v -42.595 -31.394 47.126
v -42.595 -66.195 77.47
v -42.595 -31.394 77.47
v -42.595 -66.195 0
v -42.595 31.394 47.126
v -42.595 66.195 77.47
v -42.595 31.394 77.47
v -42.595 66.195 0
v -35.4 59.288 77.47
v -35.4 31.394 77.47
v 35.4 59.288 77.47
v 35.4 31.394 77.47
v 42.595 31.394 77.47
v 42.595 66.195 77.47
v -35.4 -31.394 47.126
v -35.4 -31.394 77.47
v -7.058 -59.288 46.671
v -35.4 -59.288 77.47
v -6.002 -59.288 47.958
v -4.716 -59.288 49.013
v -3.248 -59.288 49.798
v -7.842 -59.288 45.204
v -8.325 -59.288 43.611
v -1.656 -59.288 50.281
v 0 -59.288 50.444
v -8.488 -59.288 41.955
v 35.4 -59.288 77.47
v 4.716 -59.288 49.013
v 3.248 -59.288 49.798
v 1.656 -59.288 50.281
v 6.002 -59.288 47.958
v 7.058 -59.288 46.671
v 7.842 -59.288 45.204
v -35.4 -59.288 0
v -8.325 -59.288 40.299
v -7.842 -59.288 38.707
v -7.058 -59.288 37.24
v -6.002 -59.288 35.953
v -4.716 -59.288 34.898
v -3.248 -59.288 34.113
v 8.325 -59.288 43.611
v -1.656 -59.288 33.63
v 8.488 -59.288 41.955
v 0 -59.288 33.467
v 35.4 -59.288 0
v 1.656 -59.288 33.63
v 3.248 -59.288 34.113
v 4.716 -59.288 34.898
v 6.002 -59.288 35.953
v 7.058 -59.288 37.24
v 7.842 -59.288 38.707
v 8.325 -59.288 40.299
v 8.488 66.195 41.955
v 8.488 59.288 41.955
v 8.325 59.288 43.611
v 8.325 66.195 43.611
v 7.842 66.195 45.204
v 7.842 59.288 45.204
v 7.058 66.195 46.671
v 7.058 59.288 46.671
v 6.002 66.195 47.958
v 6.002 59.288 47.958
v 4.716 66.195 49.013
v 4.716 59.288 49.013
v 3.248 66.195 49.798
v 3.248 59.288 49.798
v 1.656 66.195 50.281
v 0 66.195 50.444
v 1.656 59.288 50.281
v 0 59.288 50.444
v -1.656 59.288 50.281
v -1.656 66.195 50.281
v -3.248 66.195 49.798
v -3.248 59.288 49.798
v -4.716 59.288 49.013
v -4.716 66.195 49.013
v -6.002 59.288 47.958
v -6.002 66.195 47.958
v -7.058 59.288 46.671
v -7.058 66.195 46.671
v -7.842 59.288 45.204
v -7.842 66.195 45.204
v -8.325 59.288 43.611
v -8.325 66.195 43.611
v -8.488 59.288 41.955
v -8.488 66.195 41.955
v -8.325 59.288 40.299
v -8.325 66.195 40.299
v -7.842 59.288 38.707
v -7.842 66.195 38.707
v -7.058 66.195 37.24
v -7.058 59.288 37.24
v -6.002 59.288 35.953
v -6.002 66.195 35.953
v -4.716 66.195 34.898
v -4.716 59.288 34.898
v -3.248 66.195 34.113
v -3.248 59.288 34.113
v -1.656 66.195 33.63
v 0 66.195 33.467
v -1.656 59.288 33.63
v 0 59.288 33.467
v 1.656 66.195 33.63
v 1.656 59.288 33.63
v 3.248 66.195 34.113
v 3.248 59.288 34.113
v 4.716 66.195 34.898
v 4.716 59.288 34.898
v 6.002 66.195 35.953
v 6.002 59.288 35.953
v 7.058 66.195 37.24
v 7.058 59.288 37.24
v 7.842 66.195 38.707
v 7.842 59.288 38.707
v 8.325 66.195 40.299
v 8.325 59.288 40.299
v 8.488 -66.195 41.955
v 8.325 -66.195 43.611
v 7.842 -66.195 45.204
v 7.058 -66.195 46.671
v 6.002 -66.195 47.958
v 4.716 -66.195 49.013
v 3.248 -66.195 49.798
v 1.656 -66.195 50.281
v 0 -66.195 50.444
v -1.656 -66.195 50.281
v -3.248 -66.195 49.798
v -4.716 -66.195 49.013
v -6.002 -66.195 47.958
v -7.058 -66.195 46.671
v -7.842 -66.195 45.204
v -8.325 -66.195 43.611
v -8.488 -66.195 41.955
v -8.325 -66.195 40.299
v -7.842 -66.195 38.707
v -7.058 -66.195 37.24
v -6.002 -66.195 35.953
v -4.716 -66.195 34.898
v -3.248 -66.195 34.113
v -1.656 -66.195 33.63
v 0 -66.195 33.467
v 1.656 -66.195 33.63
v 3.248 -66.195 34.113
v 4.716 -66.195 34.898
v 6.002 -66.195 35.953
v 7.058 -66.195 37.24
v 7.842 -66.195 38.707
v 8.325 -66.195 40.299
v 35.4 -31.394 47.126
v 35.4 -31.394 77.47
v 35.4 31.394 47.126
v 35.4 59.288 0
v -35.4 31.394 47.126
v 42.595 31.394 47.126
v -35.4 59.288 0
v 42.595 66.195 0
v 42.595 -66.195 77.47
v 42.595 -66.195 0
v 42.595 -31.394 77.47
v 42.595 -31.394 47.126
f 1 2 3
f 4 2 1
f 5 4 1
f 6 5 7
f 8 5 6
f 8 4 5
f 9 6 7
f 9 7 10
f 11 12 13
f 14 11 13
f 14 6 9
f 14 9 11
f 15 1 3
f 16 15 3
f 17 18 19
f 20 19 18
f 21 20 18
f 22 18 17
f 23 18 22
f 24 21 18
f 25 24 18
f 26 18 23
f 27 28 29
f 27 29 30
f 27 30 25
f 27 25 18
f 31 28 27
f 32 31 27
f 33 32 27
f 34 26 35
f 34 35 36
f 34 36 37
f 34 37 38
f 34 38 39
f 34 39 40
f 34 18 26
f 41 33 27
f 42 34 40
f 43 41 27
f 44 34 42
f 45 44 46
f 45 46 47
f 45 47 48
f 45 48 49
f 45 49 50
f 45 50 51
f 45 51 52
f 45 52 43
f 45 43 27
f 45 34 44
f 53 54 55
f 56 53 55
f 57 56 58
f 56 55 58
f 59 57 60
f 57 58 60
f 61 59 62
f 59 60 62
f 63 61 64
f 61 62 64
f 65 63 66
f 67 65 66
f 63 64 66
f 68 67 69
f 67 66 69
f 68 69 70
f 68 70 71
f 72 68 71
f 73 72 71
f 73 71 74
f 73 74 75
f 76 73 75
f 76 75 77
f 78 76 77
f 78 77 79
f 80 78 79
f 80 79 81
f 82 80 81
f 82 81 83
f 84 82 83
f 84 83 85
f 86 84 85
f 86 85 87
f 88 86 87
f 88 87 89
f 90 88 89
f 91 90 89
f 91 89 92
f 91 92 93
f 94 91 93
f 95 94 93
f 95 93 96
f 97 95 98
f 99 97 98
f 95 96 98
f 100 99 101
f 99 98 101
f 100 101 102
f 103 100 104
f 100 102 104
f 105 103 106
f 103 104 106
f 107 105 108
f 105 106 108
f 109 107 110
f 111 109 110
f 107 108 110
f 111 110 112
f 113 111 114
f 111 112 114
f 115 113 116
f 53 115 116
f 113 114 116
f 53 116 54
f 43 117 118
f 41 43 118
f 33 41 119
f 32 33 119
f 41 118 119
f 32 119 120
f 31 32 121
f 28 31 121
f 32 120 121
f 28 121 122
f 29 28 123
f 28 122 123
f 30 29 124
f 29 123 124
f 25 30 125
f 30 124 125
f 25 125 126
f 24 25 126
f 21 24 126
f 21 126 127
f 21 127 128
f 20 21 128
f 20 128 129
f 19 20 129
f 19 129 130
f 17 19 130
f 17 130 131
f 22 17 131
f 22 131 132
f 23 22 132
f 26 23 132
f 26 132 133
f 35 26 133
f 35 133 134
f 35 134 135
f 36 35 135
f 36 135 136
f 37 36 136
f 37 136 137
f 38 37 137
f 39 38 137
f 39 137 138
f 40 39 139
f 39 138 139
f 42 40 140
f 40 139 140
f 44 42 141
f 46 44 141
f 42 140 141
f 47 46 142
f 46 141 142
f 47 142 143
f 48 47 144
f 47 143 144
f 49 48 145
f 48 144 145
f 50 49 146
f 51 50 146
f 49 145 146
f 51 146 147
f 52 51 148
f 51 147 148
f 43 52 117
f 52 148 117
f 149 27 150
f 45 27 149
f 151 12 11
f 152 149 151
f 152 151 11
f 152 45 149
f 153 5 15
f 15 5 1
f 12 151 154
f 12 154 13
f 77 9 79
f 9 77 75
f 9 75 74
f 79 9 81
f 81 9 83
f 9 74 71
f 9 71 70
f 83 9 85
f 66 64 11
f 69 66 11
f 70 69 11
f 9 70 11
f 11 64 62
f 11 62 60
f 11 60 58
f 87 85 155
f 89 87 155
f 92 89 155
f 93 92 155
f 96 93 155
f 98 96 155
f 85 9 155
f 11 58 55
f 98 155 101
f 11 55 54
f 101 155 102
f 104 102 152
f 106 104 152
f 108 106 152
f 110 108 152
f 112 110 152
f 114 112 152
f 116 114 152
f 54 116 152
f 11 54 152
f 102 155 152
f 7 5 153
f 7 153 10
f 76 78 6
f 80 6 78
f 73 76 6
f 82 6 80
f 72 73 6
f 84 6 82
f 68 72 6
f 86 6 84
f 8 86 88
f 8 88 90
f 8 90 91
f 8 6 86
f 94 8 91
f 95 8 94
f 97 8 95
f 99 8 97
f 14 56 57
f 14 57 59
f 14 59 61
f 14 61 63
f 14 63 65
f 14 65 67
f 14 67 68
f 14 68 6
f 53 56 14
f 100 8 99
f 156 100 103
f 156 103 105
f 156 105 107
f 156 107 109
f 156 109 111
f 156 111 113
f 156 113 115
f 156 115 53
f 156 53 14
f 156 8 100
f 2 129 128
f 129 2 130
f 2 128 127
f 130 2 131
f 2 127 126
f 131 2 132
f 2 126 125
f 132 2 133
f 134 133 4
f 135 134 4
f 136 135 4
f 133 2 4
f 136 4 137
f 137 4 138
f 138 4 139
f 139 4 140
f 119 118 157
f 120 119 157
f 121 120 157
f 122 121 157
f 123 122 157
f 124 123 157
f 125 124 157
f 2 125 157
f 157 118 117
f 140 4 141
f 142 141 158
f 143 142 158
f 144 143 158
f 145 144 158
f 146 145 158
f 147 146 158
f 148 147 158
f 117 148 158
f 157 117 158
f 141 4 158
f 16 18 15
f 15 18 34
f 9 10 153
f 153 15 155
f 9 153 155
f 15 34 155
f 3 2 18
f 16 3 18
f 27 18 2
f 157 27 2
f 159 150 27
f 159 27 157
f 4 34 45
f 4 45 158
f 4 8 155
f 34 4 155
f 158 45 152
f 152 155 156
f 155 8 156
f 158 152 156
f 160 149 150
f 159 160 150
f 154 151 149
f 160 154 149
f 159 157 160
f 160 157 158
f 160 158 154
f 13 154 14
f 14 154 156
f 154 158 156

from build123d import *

# Parameters (mm, degrees)
F0_W     = 85.1905047894
F0_H     = 132.3906481266
F0_W_2   = 70.8002224565
F0_H_2   = 118.5759752989
F1_DEPTH = 88.392
F2_W     = 62.7876967192
F2_H     = 41.029587388
F3_DEPTH = 85.1915047894
F4_DEPTH = 10.922
F5_R     = 8.4882818578
F6_DEPTH = 132.3916481266


with BuildPart() as f1:
    # F0 (on Top) → F1 (new body)
    with BuildSketch(Plane.XY):
        Rectangle(F0_W, F0_H)
        Rectangle(F0_W_2, F0_H_2, mode=Mode.SUBTRACT)
    extrude(amount=F1_DEPTH)

    # F2 (on face) → F3 (cut, through all)
    with BuildSketch(Plane(origin=(-42.5952523947, 0, 0), x_dir=(0, -1, 0), z_dir=(-1, 0, 0))):
        with Locations((0, 67.6403790712)):
            Rectangle(F2_W, F2_H)
    extrude(amount=-F3_DEPTH, mode=Mode.SUBTRACT)

    # F4 (cut): a face of the model
    f4_faces = [f1.faces().sort_by_distance(p)[0] for p in [
        (0, -64.6210081542, 88.392),
    ]]
    extrude(f4_faces, amount=-F4_DEPTH, mode=Mode.SUBTRACT)

    # F5 (on face) → F6 (cut, through all)
    with BuildSketch(Plane.XZ.offset(66.1953240633)):
        with Locations((0, 41.9554561377)):
            Circle(F5_R)
    extrude(amount=-F6_DEPTH, mode=Mode.SUBTRACT)


solid = f1.part
